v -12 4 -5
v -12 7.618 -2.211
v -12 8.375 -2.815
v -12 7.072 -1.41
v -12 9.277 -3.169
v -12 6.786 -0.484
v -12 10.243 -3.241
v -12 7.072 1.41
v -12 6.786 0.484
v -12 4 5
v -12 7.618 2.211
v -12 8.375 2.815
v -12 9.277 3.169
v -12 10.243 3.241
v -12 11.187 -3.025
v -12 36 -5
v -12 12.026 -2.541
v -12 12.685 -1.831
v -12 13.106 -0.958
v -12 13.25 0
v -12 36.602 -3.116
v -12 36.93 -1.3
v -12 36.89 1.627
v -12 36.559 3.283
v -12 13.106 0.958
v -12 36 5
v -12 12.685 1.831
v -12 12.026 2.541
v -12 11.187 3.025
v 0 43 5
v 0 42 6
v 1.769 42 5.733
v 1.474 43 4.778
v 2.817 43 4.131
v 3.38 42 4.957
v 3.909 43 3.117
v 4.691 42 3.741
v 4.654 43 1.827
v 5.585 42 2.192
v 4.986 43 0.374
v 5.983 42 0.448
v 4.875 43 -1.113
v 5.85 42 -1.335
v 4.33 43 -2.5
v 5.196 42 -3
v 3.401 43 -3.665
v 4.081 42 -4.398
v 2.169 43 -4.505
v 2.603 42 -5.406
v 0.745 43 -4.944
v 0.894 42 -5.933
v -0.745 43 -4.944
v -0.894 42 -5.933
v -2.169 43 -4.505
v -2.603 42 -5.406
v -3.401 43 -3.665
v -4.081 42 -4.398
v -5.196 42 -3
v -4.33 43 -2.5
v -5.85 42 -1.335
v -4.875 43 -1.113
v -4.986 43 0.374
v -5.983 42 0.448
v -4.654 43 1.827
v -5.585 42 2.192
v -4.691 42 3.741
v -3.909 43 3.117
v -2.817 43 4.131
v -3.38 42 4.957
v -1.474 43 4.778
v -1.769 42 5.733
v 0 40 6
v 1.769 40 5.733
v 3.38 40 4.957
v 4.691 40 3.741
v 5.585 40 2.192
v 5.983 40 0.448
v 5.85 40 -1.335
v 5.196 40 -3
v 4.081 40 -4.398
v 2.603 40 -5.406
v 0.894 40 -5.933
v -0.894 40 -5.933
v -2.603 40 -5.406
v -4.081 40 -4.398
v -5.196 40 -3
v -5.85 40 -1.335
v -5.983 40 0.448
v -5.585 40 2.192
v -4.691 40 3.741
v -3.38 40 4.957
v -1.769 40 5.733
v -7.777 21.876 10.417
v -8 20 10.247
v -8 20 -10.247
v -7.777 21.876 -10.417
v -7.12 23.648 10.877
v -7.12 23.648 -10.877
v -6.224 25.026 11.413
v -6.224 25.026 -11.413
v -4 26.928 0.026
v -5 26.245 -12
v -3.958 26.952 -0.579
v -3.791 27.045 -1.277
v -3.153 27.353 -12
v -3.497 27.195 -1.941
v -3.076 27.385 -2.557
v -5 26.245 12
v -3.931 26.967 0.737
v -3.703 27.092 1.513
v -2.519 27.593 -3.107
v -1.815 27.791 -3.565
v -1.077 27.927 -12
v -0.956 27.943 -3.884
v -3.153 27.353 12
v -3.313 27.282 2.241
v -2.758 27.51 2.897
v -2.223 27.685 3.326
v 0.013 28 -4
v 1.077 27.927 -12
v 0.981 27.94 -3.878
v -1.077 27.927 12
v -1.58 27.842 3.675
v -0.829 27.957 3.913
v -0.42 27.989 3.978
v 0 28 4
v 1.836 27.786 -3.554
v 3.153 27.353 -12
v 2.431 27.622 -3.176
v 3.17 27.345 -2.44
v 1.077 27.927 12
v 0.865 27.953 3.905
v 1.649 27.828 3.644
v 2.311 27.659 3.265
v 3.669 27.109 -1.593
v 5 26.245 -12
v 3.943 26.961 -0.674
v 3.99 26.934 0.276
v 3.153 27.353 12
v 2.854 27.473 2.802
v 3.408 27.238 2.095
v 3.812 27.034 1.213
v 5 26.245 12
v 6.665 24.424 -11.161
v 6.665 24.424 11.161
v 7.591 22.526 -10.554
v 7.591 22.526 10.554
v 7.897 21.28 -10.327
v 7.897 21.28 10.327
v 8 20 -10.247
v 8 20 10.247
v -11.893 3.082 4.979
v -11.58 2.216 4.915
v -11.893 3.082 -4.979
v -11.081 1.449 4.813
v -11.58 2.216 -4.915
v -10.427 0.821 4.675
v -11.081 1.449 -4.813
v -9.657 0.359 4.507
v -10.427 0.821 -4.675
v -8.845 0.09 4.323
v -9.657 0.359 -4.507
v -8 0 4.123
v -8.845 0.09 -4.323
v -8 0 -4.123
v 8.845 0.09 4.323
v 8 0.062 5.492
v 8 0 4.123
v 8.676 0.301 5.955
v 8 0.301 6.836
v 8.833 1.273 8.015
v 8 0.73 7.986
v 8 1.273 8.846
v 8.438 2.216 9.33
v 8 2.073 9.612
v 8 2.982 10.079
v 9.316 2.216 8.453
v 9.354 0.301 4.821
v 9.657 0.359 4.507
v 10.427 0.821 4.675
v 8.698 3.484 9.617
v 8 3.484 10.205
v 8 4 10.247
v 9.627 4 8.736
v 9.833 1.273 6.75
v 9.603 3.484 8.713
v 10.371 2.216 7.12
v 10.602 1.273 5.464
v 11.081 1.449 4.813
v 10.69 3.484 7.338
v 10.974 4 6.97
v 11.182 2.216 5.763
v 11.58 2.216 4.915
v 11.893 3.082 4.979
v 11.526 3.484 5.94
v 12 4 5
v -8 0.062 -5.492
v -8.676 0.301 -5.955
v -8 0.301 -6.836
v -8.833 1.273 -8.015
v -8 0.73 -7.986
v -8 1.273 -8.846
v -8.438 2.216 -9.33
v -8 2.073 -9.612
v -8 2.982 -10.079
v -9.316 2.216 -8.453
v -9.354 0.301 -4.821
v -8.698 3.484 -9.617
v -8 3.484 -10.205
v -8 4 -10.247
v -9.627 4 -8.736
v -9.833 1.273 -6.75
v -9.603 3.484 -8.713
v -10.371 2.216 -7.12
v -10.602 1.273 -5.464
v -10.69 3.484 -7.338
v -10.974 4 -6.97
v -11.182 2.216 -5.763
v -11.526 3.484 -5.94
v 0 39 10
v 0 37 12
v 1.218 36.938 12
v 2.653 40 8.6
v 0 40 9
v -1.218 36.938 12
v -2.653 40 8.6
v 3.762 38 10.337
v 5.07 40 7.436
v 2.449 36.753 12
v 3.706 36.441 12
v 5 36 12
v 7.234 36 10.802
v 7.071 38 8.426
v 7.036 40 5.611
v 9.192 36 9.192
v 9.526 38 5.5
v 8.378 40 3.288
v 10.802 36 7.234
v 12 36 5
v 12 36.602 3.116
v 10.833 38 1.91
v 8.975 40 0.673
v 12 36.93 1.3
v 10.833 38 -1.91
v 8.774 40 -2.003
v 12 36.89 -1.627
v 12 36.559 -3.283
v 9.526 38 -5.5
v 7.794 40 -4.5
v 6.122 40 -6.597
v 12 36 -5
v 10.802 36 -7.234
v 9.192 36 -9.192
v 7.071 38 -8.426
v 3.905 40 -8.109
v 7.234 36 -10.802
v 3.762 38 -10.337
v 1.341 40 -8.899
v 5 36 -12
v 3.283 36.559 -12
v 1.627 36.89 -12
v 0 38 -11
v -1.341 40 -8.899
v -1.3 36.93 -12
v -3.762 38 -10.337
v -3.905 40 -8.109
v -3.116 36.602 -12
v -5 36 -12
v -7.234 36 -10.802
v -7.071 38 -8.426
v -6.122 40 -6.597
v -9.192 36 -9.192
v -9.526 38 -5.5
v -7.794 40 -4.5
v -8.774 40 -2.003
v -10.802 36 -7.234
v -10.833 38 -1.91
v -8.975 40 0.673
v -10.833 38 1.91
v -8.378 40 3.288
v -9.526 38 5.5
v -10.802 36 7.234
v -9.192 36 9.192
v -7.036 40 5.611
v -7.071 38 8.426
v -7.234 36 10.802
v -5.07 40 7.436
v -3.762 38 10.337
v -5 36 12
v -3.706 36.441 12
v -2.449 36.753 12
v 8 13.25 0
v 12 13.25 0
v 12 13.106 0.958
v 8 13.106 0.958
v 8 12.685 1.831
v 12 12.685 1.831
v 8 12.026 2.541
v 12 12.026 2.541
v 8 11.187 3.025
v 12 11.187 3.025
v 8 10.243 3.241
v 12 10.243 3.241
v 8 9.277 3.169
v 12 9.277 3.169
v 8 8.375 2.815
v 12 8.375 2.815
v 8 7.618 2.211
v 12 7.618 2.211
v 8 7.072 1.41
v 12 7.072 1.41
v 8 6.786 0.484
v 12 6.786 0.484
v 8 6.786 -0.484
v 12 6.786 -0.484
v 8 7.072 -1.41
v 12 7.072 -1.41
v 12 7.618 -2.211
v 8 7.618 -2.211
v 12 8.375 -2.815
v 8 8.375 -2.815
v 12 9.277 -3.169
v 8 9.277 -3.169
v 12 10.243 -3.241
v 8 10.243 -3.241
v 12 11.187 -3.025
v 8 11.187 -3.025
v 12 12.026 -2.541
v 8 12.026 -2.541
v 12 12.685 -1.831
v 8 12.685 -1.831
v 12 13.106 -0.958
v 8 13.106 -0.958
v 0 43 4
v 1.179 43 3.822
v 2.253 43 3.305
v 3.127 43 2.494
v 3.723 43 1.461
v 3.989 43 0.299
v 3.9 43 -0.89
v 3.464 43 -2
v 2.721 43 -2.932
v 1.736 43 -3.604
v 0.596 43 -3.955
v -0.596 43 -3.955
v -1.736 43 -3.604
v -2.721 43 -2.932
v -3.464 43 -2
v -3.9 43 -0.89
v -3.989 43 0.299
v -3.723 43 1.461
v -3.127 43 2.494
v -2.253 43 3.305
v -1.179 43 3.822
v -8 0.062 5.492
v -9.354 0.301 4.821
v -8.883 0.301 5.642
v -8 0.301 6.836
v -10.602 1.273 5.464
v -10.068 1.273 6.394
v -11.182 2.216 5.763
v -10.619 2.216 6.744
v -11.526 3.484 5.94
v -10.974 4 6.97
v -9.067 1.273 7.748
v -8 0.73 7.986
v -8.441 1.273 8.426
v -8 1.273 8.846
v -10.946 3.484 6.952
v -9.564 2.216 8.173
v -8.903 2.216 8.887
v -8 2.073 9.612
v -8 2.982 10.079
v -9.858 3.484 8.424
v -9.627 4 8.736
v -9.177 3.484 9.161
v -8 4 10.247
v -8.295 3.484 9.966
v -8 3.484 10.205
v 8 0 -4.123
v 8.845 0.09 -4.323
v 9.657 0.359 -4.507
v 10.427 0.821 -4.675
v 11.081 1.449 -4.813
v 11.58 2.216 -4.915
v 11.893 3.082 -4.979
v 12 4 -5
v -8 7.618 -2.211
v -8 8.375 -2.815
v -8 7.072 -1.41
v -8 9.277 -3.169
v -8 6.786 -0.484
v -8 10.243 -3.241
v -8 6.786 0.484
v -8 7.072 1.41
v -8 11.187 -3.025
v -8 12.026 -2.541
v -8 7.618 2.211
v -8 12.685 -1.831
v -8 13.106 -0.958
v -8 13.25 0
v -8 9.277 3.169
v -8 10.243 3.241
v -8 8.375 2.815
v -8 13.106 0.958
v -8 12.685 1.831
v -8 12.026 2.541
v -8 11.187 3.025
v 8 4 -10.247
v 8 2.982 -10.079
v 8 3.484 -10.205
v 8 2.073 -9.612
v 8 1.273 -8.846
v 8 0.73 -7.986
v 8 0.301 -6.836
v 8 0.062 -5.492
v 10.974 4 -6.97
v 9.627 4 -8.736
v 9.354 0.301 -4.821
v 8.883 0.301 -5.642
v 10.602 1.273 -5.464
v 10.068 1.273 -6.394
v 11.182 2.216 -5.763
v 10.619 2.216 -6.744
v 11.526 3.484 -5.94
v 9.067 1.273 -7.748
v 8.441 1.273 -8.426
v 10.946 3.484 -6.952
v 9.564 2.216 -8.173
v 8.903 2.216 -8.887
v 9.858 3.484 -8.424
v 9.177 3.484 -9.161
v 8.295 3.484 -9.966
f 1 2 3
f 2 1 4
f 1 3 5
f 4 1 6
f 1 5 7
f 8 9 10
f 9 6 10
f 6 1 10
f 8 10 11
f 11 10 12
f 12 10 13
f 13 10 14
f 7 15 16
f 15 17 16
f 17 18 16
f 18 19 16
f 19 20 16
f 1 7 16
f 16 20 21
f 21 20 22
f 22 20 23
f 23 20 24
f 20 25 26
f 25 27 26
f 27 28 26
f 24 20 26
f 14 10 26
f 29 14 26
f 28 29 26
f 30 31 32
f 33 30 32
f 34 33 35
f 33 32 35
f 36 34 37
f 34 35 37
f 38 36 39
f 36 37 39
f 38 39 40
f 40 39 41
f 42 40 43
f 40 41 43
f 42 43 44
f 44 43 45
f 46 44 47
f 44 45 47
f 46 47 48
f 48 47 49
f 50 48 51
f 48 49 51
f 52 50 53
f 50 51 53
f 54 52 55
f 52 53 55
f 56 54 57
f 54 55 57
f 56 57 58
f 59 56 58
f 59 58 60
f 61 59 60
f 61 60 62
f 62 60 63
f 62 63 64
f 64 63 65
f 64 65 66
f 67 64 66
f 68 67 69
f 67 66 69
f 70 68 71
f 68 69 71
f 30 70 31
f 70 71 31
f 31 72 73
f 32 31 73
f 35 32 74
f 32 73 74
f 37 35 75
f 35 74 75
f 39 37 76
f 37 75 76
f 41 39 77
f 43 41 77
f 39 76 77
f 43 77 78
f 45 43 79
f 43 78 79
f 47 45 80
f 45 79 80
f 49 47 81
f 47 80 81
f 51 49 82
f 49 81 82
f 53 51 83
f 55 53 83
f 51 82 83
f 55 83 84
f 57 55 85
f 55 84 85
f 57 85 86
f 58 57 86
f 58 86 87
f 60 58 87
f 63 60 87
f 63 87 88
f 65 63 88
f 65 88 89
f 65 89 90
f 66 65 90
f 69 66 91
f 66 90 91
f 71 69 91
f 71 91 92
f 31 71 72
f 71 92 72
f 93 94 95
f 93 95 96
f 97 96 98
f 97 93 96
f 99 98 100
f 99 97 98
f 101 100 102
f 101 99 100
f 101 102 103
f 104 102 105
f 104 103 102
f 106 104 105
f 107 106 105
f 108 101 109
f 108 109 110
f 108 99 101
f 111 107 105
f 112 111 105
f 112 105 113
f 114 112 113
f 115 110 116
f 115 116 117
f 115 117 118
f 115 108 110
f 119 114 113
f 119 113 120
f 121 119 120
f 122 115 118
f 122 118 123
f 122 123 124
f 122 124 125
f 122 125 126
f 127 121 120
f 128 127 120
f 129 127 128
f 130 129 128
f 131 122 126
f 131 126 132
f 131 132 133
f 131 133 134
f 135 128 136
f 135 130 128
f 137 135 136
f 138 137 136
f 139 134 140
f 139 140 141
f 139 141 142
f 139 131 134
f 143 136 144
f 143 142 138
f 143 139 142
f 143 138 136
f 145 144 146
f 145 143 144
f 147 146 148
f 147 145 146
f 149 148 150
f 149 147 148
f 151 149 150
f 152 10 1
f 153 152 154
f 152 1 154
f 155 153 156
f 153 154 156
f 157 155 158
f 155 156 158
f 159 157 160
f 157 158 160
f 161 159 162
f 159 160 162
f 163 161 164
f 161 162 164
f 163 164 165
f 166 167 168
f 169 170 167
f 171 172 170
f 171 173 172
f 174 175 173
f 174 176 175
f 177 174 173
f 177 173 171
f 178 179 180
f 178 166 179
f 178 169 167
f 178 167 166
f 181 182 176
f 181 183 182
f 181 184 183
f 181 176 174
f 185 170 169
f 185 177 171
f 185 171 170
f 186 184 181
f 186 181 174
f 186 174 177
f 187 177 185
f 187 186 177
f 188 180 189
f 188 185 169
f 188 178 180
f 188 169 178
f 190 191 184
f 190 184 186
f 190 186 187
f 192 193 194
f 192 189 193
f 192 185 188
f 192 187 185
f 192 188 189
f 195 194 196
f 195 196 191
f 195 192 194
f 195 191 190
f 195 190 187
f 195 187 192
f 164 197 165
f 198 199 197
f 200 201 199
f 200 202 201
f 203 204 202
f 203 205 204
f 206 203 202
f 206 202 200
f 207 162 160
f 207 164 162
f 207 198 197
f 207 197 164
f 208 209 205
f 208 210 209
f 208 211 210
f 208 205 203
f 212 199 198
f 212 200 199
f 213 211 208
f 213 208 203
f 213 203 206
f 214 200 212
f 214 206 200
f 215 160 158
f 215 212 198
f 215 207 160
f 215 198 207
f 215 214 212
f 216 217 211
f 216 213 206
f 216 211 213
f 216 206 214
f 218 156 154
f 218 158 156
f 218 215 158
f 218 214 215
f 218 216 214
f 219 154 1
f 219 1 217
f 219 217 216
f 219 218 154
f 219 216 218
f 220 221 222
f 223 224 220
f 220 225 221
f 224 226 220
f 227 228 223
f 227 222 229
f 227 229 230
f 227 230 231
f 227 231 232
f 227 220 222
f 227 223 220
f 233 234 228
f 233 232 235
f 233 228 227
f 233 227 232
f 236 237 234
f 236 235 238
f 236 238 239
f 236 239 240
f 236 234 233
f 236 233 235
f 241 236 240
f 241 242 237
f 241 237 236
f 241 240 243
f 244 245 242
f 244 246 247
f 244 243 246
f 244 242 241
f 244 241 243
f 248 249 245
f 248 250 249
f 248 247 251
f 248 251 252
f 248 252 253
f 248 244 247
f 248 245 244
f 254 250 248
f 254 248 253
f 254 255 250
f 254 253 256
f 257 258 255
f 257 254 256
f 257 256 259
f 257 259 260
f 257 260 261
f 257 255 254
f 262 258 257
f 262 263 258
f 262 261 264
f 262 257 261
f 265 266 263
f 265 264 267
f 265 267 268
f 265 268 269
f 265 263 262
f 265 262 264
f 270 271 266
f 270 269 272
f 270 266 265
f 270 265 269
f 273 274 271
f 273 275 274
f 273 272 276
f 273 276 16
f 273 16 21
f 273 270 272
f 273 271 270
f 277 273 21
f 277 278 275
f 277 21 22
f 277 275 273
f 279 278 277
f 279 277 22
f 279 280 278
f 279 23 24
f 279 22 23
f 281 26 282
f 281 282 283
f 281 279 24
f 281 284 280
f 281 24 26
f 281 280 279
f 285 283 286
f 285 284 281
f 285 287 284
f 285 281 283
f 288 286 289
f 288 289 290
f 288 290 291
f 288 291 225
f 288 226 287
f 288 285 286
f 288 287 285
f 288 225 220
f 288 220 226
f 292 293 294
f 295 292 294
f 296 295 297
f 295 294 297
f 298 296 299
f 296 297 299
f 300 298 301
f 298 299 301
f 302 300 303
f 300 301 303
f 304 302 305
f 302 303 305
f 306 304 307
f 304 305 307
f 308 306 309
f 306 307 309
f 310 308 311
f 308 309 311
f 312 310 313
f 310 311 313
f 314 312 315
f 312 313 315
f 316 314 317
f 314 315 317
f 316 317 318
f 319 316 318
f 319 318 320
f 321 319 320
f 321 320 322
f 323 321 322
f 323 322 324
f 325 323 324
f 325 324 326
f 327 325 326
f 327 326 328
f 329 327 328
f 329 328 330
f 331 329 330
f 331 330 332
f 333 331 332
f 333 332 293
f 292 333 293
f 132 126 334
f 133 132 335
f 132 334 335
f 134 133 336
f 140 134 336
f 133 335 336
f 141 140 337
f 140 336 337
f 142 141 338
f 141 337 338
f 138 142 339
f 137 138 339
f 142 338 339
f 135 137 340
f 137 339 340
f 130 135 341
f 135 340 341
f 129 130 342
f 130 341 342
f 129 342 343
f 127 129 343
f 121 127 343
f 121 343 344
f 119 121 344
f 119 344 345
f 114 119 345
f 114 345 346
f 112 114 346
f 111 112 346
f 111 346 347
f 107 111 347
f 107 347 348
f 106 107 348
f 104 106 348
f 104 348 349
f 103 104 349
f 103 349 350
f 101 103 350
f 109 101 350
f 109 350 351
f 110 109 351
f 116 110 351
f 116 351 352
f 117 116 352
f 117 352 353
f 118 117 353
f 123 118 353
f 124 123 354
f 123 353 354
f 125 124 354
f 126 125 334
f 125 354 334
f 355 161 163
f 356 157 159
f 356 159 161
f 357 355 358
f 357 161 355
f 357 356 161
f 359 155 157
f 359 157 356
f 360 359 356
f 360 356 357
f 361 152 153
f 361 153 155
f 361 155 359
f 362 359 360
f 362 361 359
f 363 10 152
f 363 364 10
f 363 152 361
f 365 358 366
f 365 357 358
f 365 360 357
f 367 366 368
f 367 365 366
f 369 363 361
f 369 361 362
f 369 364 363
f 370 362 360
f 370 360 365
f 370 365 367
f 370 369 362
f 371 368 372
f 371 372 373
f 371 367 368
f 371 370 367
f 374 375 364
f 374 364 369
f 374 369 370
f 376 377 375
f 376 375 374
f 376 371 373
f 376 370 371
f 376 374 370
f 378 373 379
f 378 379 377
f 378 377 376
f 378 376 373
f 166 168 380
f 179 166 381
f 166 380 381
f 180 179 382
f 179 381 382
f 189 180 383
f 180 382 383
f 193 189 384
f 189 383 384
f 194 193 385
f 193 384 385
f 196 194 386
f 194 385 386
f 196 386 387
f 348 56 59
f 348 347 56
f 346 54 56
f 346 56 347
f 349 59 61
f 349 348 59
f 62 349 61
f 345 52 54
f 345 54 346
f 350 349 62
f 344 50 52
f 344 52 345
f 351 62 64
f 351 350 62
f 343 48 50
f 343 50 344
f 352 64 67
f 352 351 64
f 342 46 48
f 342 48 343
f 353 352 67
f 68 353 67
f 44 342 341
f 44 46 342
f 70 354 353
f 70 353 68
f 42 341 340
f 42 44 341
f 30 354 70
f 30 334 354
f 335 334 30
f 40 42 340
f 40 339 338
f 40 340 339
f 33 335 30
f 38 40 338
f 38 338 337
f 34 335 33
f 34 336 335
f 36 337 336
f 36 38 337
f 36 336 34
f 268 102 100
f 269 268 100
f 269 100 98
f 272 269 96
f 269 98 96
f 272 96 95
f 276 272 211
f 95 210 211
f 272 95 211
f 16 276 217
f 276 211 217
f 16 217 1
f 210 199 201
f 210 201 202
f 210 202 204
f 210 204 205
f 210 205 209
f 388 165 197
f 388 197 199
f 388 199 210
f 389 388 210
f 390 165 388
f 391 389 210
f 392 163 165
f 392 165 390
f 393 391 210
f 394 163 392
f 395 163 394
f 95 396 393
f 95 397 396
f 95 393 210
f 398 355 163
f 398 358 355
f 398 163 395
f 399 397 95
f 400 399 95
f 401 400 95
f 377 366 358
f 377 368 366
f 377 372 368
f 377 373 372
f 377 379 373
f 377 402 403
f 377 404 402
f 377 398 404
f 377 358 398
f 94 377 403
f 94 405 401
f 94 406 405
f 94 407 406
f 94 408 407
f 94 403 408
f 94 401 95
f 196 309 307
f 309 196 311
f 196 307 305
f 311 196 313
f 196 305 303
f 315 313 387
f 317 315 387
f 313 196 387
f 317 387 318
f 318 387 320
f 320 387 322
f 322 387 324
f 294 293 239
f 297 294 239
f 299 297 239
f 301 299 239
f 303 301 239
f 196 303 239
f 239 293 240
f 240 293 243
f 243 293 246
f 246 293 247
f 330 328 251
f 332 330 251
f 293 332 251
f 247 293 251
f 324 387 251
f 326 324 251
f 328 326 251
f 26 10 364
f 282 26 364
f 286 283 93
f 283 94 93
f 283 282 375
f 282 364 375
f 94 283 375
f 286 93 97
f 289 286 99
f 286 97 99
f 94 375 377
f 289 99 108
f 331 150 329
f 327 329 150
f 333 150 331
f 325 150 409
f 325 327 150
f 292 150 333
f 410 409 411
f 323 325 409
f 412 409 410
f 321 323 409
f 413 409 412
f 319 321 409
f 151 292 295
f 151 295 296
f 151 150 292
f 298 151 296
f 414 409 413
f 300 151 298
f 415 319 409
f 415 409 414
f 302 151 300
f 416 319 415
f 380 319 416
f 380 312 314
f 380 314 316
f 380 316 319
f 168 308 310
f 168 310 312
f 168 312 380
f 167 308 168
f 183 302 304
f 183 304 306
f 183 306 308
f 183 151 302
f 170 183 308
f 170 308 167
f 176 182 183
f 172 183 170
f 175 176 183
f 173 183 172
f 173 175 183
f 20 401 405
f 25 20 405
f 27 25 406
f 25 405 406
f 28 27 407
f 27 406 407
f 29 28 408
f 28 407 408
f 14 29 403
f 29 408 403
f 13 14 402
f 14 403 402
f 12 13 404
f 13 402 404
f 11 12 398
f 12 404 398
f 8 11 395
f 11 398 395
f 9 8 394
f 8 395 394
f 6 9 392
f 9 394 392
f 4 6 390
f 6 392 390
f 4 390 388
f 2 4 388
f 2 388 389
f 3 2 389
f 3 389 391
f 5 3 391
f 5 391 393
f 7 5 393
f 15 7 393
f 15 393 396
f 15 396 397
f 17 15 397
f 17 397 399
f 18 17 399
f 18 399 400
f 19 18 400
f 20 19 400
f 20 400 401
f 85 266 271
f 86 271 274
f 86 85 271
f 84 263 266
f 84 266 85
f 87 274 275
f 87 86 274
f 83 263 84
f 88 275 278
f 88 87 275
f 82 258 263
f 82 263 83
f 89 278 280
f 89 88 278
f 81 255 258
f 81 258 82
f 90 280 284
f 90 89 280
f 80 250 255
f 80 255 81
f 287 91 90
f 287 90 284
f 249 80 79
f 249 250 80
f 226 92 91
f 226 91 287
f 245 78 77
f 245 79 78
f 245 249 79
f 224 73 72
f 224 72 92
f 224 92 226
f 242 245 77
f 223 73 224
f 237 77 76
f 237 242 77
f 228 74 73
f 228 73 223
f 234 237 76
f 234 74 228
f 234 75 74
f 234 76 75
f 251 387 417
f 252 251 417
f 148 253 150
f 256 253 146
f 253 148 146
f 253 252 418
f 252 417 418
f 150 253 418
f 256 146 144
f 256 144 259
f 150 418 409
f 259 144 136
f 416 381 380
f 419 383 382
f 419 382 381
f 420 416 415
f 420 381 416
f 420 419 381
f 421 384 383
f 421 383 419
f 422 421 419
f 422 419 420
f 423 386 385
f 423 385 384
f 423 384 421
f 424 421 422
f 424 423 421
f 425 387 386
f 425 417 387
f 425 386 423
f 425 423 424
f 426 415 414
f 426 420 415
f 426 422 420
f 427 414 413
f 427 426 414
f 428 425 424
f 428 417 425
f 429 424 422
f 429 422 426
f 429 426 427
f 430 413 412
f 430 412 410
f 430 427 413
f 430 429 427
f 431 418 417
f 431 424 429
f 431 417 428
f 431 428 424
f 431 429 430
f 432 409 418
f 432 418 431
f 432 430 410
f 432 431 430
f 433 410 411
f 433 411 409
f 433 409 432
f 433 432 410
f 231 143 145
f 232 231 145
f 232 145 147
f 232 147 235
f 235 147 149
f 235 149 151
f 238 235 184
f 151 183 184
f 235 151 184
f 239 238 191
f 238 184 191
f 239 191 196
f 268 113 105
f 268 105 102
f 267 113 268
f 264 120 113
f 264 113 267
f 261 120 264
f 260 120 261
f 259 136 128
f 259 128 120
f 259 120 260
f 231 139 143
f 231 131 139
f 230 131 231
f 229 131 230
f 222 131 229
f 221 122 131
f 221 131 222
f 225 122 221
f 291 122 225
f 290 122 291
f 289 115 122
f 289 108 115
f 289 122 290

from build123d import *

# Parameters (mm, degrees)
SKETCH1_R               = 13
BOSS_EXTRUDE1_DEPTH     = 40
CHAMFER1_SIZE           = 4
SKETCH2_W               = 9.245775376
SKETCH2_H               = 49.025160165
CUT_EXTRUDE1_DEPTH      = 20
SKETCH3_W               = 9.286622431
SKETCH3_H               = 52.181973662
CUT_EXTRUDE2_DEPTH      = 20
CUT_EXTRUDE3_DEPTH      = 20
FILLET9_R               = 4
CUT_EXTRUDE4_REACH      = 50.166
SKETCH5_R               = 3.25
SKETCH6_R               = 6
BOSS_EXTRUDE2_DEPTH     = 3
CUT_EXTRUDE5_REACH      = 48.228
CUT_EXTRUDE5_END_RADIUS = 8
SKETCH7_R               = 4
CHAMFER2_SIZE           = 1


with BuildPart() as part:
    # Sketch1 → Boss-Extrude1 (new body)
    with BuildSketch(Plane(origin=(0, 0, 0), x_dir=(1, 0, 0), z_dir=(0, 1, 0))):
        with Locations(Location((0, 0, 0), (0, 0, 270))):
            Circle(SKETCH1_R)
    extrude(amount=BOSS_EXTRUDE1_DEPTH)

    # Chamfer1
    chamfer1_edges = [part.edges().sort_by_distance(p)[0] for p in [
        (0, 40, -13),
    ]]
    chamfer(chamfer1_edges, length=CHAMFER1_SIZE)

    # Sketch2 → Cut-Extrude1 (cut, symmetric)
    with BuildSketch(Plane(origin=(0, 0, 0), x_dir=(0, 0, -1), z_dir=(1, 0, 0))):
        with Locations((-16.622887688, 20.157854701)):
            Rectangle(SKETCH2_W, SKETCH2_H)
        with Locations((16.622887688, 20.157854701)):
            Rectangle(SKETCH2_W, SKETCH2_H)
    extrude(amount=CUT_EXTRUDE1_DEPTH, both=True, mode=Mode.SUBTRACT)

    # Sketch3 → Cut-Extrude2 (cut, symmetric)
    with BuildSketch(Plane.XY):
        with Locations((16.643311215, 16.67537129)):
            Rectangle(SKETCH3_W, SKETCH3_H)
        with Locations((-16.643311215, 16.67537129)):
            Rectangle(SKETCH3_W, SKETCH3_H)
    extrude(amount=CUT_EXTRUDE2_DEPTH, both=True, mode=Mode.SUBTRACT)

    # Sketch4 → Cut-Extrude3 (cut, symmetric)
    with BuildSketch(Plane.XY):
        with BuildLine():
            Line((8, 20), (8, 0))
            Line((8, 0), (-8, 0))
            Line((-8, 0), (-8, 20))
            ThreePointArc((-8, 20), (0, 28), (8, 20))
        make_face()
    extrude(amount=CUT_EXTRUDE3_DEPTH, both=True, mode=Mode.SUBTRACT)

    # Fillet9
    # the kernel refuses this fillet: 4 mm, written as the material it takes off along each edge
    with BuildSketch(Plane(origin=(0, 0, 0), x_dir=(0.9307006586833979, 0, 0.3657817435661457), z_dir=(-0.3657817435661457, 0, 0.9307006586833979))) as fillet9_piece_1:
        with BuildLine():
            CenterArc((13 - FILLET9_R, FILLET9_R), FILLET9_R, 270, 90)
            Line((13 - FILLET9_R, 0), (13, 0))
            Line((13, 0), (13, FILLET9_R))
        make_face()
    revolve(axis=Axis((0, 0, 0), (0, 1, 0)), revolution_arc=117.551393411, mode=Mode.SUBTRACT)
    with BuildSketch(Plane(origin=(0, 0, 0), x_dir=(-0.9307006586833977, 0, -0.36578174356614573), z_dir=(0.36578174356614573, 0, -0.9307006586833977))) as fillet9_piece_2:
        with BuildLine():
            CenterArc((13 - FILLET9_R, FILLET9_R), FILLET9_R, 270, 90)
            Line((13, FILLET9_R), (13, 0))
            Line((13, 0), (13 - FILLET9_R, 0))
        make_face()
    revolve(axis=Axis((0, 0, 0), (0, 1, 0)), revolution_arc=117.551393411, mode=Mode.SUBTRACT)
    with BuildSketch(Plane(origin=(12, 0, -15), x_dir=(0, 1, 0), z_dir=(0, 0, 1)), Plane(origin=(-12, 0, -15), x_dir=(1, 0, 0), z_dir=(0, 0, 1))) as fillet9_piece_3:
        with BuildLine():
            CenterArc((FILLET9_R, FILLET9_R), FILLET9_R, 180, 90)
            Line((0, FILLET9_R), (0, 0))
            Line((0, 0), (FILLET9_R, 0))
        make_face()
    extrude(amount=30, mode=Mode.SUBTRACT)
    with BuildSketch(Plane(origin=(0, 0, 0), x_dir=(-0.1061893245847588, 0, 0.9943459294150264), z_dir=(-0.9943459294150264, 0, -0.1061893245847588))) as fillet9_piece_4:
        with BuildLine():
            CenterArc((13 - FILLET9_R, FILLET9_R), FILLET9_R, 270, 90)
            Line((13 - FILLET9_R, 0), (13, 0))
            Line((13, 0), (13, FILLET9_R))
        make_face()
    revolve(axis=Axis((0, 0, 0), (0, 1, 0)), revolution_arc=117.551393411, mode=Mode.SUBTRACT)
    with BuildSketch(Plane(origin=(0, 0, 0), x_dir=(0.10618932458475924, 0, -0.9943459294150264), z_dir=(0.9943459294150264, 0, 0.10618932458475924))) as fillet9_piece_5:
        with BuildLine():
            CenterArc((13 - FILLET9_R, FILLET9_R), FILLET9_R, 270, 90)
            Line((13 - FILLET9_R, 0), (13, 0))
            Line((13, 0), (13, FILLET9_R))
        make_face()
    revolve(axis=Axis((0, 0, 0), (0, 1, 0)), revolution_arc=117.551393411, mode=Mode.SUBTRACT)

    # Cut-Extrude4: up to this face of the body (flat: up to its plane)
    cut_extrude4_end = Plane(part.part.faces().sort_by_distance((-12, 20.3320271, 0))[0])
    # Sketch5 → Cut-Extrude4 (cut, up to the picked face)
    with BuildSketch(Plane(origin=(12, 0, 0), x_dir=(0, 0, -1), z_dir=(1, 0, 0)), mode=Mode.PRIVATE) as cut_extrude4_sk1:
        with Locations(Location((0, 10, 0), (0, 0, 90))):
            Circle(SKETCH5_R)
    cut_extrude4_tool1 = split(extrude(cut_extrude4_sk1.sketch, amount=-CUT_EXTRUDE4_REACH, mode=Mode.PRIVATE), bisect_by=cut_extrude4_end, keep=Keep.BOTH, mode=Mode.PRIVATE)
    add(cut_extrude4_tool1.solids().sort_by(Axis((12, 10, 0), (-1, 0, 0)))[0], mode=Mode.SUBTRACT)

    # Sketch6 → Boss-Extrude2 (add)
    with BuildSketch(Plane(origin=(0, 40, 0), x_dir=(1, 0, 0), z_dir=(0, 1, 0))):
        with Locations(Location((0, 0, 0), (0, 0, 270))):
            Circle(SKETCH6_R)
    extrude(amount=BOSS_EXTRUDE2_DEPTH)

    # Cut-Extrude5: up to this cylinder (the profile starts outside it)
    cut_extrude5_end = Plane(origin=(0, 20, 0), z_dir=(0, 0, 1)) * Cylinder(CUT_EXTRUDE5_END_RADIUS, 113.456, mode=Mode.PRIVATE)
    # Sketch7 → Cut-Extrude5 (cut, up to the surface)
    with BuildSketch(Plane(origin=(0, 43, 0), x_dir=(1, 0, 0), z_dir=(0, 1, 0)), mode=Mode.PRIVATE) as cut_extrude5_sk1:
        with Locations(Location((0, 0, 0), (0, 0, 270))):
            Circle(SKETCH7_R)
    cut_extrude5_tool1 = extrude(cut_extrude5_sk1.sketch, amount=-CUT_EXTRUDE5_REACH, mode=Mode.PRIVATE) - cut_extrude5_end
    add(cut_extrude5_tool1.solids().sort_by_distance((0, 43, 0))[0], mode=Mode.SUBTRACT)

    # Chamfer2
    chamfer2_edges = [part.edges().sort_by_distance(p)[0] for p in [
        (0, 43, -6),
    ]]
    chamfer(chamfer2_edges, length=CHAMFER2_SIZE)


solid = part.part
